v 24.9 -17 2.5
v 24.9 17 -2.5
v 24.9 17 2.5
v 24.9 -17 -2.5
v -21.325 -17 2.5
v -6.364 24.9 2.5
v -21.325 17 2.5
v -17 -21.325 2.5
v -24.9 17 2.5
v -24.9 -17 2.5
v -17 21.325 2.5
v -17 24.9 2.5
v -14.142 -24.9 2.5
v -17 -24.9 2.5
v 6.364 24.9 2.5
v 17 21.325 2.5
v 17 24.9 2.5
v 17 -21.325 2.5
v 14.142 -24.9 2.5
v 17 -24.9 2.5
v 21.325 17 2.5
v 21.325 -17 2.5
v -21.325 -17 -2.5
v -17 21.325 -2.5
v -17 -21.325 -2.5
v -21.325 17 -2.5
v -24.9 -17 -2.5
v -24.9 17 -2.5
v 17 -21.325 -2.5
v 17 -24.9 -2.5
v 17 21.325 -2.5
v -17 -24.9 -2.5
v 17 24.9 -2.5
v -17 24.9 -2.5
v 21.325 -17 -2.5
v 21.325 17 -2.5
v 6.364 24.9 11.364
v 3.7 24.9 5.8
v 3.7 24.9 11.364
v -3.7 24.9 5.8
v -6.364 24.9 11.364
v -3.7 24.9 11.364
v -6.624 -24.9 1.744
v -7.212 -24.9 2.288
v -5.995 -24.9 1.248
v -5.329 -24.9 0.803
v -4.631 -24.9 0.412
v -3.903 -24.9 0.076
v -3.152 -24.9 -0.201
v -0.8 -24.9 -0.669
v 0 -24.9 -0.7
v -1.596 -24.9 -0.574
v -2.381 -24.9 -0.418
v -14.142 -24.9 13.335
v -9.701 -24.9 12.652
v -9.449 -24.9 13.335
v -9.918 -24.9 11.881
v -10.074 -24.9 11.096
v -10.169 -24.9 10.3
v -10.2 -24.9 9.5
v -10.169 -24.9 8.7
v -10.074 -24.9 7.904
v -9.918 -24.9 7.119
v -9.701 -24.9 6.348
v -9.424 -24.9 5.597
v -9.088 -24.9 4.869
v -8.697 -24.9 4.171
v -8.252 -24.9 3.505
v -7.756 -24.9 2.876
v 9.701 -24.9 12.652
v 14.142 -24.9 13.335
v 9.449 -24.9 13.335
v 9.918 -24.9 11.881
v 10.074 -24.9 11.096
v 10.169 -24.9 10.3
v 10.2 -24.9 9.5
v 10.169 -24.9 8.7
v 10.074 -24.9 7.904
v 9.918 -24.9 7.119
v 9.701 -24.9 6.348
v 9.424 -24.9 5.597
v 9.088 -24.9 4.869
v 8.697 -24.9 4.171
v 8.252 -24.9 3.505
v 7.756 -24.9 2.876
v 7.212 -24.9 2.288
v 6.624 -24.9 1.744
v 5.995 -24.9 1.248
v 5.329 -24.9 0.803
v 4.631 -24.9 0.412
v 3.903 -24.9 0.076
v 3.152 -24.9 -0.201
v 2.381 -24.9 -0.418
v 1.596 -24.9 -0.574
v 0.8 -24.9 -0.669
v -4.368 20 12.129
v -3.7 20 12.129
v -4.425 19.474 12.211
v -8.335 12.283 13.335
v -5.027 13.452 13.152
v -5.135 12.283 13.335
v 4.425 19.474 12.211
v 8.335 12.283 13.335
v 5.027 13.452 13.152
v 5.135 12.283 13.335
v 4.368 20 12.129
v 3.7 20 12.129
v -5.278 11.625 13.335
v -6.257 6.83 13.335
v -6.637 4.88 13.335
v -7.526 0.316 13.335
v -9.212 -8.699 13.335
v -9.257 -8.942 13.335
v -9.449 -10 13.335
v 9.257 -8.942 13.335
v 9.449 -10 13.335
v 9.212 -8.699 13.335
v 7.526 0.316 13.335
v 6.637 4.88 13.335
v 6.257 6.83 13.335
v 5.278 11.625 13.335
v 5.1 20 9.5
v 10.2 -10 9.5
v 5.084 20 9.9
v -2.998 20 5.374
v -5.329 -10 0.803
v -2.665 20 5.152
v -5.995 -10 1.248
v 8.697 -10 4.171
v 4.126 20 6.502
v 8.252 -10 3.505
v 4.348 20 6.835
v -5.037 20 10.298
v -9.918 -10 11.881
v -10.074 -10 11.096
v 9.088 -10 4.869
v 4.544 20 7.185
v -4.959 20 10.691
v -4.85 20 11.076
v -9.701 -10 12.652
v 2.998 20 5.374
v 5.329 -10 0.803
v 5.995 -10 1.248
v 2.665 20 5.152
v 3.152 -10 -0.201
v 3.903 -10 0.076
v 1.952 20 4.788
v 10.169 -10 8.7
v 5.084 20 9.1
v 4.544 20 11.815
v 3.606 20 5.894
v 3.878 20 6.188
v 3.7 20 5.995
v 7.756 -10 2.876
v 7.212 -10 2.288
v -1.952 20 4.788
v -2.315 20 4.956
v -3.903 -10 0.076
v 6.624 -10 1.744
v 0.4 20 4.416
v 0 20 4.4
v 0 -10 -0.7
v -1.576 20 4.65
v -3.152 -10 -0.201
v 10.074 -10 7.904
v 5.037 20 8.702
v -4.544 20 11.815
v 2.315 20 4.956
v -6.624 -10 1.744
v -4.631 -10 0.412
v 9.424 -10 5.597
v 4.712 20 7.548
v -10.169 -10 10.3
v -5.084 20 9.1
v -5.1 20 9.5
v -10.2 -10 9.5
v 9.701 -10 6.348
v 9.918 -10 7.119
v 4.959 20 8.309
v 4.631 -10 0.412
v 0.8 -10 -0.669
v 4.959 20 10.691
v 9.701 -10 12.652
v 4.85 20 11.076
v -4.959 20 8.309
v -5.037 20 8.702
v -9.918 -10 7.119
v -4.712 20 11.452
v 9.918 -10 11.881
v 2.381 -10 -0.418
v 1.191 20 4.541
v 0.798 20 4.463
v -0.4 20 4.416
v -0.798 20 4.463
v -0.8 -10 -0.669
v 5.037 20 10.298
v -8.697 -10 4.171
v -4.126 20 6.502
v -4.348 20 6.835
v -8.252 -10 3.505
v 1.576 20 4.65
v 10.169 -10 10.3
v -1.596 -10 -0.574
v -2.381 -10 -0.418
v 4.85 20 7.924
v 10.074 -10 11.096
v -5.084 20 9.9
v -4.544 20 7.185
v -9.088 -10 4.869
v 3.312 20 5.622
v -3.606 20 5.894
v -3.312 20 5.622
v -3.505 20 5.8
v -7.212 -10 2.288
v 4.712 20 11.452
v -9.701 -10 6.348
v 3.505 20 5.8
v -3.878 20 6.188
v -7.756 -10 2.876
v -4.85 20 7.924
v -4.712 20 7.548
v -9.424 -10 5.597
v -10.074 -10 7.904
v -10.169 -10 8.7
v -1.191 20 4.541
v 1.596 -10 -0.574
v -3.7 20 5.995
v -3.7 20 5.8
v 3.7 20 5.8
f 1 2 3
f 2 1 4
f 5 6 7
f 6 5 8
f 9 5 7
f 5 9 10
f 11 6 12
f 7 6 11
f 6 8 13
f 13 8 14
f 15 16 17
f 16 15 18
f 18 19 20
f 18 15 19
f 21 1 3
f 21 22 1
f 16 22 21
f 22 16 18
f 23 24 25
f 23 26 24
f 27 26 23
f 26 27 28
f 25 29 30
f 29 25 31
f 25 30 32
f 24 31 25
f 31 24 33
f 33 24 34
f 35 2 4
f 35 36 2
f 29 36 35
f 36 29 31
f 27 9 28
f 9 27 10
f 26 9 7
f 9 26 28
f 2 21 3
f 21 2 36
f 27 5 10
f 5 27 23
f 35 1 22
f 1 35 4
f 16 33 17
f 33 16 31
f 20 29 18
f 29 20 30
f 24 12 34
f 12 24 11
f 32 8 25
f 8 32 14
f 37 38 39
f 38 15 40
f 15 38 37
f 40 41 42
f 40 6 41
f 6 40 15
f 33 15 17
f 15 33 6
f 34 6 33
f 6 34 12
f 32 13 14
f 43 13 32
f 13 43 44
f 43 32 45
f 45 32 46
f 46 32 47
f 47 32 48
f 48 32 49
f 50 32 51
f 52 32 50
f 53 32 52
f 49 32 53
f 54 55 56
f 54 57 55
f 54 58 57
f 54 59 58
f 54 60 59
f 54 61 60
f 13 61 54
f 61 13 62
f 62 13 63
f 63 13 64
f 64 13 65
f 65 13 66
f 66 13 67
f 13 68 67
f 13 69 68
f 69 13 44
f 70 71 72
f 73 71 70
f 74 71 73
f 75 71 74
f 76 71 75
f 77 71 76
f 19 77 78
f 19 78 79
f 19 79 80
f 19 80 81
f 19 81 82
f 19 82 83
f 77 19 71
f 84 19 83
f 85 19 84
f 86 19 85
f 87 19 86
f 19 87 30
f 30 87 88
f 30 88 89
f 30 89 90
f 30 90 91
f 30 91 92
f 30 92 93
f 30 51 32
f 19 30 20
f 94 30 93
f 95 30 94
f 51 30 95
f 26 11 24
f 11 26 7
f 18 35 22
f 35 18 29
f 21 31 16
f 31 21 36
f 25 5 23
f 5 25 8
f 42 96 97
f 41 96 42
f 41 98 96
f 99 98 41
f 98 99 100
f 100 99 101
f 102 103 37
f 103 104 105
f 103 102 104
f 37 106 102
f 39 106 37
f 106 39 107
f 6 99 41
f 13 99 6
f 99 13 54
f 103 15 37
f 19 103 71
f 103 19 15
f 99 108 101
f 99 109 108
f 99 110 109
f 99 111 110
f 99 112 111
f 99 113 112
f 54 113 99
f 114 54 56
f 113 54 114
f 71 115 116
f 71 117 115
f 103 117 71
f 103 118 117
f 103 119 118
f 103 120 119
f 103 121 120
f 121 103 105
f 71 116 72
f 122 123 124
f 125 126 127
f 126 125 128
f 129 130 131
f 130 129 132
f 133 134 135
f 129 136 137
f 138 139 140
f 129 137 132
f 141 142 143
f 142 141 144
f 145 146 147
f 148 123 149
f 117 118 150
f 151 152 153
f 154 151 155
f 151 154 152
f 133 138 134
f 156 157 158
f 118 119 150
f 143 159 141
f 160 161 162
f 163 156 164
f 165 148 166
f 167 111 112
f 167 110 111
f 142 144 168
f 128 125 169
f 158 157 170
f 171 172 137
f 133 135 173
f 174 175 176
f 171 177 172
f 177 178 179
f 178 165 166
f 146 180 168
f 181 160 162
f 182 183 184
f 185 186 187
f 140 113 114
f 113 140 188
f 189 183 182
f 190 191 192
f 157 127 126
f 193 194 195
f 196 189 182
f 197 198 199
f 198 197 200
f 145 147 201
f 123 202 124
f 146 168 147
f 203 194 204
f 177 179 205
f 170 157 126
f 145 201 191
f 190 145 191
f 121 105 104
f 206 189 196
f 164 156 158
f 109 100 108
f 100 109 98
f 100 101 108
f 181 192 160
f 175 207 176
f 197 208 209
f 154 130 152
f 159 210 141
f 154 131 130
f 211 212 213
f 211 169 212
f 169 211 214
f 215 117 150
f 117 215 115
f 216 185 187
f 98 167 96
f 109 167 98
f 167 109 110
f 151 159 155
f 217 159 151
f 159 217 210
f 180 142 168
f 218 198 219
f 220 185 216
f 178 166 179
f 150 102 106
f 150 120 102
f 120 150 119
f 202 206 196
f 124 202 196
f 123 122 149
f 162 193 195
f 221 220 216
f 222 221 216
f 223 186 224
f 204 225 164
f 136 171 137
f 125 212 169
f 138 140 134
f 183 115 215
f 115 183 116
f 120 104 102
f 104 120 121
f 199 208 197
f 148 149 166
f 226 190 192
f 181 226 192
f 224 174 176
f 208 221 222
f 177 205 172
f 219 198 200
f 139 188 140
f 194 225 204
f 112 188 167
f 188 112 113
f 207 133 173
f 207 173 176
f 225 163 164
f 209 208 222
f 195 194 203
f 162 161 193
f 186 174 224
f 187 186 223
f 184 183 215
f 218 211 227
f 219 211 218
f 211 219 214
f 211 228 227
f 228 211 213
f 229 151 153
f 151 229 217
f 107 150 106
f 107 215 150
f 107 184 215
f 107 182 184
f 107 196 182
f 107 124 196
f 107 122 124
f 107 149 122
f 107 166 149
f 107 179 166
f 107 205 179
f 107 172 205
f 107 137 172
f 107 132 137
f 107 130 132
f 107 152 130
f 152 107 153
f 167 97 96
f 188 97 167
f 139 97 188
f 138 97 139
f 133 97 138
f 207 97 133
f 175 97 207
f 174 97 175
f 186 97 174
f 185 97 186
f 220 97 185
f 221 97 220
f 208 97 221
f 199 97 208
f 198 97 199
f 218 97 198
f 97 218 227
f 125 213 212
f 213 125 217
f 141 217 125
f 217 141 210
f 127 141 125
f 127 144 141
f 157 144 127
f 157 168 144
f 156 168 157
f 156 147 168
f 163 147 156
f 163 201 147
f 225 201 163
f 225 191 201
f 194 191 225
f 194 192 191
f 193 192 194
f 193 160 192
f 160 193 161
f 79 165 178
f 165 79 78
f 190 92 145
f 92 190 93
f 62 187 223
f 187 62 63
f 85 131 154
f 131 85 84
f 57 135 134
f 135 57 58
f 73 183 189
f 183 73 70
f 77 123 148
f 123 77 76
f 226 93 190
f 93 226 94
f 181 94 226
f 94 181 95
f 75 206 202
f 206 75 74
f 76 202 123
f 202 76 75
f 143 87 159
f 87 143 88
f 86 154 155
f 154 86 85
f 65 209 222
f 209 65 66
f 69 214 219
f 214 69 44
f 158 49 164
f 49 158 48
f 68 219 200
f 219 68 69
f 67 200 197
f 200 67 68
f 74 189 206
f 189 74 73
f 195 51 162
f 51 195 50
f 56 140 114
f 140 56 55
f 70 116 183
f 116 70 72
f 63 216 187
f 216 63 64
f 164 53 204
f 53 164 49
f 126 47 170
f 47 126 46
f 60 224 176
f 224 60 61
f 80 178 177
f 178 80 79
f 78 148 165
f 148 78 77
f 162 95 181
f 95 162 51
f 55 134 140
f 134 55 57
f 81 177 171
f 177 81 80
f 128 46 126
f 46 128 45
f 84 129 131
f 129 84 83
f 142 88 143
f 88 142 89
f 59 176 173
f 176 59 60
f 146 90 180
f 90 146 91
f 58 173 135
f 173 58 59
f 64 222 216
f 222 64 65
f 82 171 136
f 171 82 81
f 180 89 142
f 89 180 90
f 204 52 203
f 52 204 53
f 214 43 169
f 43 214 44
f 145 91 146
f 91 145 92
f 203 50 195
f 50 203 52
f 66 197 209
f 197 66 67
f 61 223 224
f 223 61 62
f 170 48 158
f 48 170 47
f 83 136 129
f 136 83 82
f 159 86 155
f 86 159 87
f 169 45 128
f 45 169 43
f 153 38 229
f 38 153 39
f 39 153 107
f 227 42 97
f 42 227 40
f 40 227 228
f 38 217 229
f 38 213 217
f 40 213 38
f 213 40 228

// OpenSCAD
// IN PROGRESS
//Cube insert: beam expander


/* [Hiden] */
$fn = 80;
eps = .002;
a = 49.8;
b = 33.6;
c = 6.28;
d = 53.8;
h = 5;
IM_offset = 0.2;

1st_lens_w = 7;   // phone lens side size
1st_lens_h = 3;

2nd_lens_d = 20;  // objective lens diameter
2nd_lens_h = 10;

lens_l = 30;


module Insert() {
    union() {   //basic insert design
            cube([a,b+2*IM_offset,h], center=true);
            cube([b+2*IM_offset,a,h], center=true);
            rotate(a=[0,0,45]){
                cube([c,d+2*IM_offset,h], center=true);
            }
            rotate(a=[0,0,-45]){
                cube([c,d+2*IM_offset,h], center=true);
            }
        }
}

module LensTube() {
    translate([0,5,2nd_lens_d/2-(h/2-2)]) // 2nd_lens_d/2
    rotate([90,0,0])
    union() {
        cylinder(h=lens_l,
                 d1=1st_lens_w*1.4 + 2*IM_offset,
                 d2=2nd_lens_d + 2*IM_offset, center=true);
        
        translate([0,0,
                   lens_l/2+2nd_lens_h*2])
        cylinder(h=2nd_lens_h*4,
                 d=2nd_lens_d + 2*IM_offset, center=true);
        
        translate([0,0,
                   -(lens_l/2+1st_lens_h*2)])
        cube([1st_lens_w + 2*IM_offset,
              1st_lens_w + 2*IM_offset,
              1st_lens_h*4],
              center=true);
    }
}

module ExpanderInsert() {
    difference() {
        union(){
            Insert();
            translate([0,0,5])
            rotate([-90,45,0])
            difference() {
                cylinder(a,2nd_lens_d,1st_lens_w+2,
                         $fn=4,center=true);
                
                translate([0,25,0])
                rotate([0,0,45])
                cube([30,100,a], center=true);

                translate([0,-33,0])
                rotate([0,0,45])                
                cube([30,100,a], center=true);
            }
        }
        LensTube();
    }  
}


ExpanderInsert();
